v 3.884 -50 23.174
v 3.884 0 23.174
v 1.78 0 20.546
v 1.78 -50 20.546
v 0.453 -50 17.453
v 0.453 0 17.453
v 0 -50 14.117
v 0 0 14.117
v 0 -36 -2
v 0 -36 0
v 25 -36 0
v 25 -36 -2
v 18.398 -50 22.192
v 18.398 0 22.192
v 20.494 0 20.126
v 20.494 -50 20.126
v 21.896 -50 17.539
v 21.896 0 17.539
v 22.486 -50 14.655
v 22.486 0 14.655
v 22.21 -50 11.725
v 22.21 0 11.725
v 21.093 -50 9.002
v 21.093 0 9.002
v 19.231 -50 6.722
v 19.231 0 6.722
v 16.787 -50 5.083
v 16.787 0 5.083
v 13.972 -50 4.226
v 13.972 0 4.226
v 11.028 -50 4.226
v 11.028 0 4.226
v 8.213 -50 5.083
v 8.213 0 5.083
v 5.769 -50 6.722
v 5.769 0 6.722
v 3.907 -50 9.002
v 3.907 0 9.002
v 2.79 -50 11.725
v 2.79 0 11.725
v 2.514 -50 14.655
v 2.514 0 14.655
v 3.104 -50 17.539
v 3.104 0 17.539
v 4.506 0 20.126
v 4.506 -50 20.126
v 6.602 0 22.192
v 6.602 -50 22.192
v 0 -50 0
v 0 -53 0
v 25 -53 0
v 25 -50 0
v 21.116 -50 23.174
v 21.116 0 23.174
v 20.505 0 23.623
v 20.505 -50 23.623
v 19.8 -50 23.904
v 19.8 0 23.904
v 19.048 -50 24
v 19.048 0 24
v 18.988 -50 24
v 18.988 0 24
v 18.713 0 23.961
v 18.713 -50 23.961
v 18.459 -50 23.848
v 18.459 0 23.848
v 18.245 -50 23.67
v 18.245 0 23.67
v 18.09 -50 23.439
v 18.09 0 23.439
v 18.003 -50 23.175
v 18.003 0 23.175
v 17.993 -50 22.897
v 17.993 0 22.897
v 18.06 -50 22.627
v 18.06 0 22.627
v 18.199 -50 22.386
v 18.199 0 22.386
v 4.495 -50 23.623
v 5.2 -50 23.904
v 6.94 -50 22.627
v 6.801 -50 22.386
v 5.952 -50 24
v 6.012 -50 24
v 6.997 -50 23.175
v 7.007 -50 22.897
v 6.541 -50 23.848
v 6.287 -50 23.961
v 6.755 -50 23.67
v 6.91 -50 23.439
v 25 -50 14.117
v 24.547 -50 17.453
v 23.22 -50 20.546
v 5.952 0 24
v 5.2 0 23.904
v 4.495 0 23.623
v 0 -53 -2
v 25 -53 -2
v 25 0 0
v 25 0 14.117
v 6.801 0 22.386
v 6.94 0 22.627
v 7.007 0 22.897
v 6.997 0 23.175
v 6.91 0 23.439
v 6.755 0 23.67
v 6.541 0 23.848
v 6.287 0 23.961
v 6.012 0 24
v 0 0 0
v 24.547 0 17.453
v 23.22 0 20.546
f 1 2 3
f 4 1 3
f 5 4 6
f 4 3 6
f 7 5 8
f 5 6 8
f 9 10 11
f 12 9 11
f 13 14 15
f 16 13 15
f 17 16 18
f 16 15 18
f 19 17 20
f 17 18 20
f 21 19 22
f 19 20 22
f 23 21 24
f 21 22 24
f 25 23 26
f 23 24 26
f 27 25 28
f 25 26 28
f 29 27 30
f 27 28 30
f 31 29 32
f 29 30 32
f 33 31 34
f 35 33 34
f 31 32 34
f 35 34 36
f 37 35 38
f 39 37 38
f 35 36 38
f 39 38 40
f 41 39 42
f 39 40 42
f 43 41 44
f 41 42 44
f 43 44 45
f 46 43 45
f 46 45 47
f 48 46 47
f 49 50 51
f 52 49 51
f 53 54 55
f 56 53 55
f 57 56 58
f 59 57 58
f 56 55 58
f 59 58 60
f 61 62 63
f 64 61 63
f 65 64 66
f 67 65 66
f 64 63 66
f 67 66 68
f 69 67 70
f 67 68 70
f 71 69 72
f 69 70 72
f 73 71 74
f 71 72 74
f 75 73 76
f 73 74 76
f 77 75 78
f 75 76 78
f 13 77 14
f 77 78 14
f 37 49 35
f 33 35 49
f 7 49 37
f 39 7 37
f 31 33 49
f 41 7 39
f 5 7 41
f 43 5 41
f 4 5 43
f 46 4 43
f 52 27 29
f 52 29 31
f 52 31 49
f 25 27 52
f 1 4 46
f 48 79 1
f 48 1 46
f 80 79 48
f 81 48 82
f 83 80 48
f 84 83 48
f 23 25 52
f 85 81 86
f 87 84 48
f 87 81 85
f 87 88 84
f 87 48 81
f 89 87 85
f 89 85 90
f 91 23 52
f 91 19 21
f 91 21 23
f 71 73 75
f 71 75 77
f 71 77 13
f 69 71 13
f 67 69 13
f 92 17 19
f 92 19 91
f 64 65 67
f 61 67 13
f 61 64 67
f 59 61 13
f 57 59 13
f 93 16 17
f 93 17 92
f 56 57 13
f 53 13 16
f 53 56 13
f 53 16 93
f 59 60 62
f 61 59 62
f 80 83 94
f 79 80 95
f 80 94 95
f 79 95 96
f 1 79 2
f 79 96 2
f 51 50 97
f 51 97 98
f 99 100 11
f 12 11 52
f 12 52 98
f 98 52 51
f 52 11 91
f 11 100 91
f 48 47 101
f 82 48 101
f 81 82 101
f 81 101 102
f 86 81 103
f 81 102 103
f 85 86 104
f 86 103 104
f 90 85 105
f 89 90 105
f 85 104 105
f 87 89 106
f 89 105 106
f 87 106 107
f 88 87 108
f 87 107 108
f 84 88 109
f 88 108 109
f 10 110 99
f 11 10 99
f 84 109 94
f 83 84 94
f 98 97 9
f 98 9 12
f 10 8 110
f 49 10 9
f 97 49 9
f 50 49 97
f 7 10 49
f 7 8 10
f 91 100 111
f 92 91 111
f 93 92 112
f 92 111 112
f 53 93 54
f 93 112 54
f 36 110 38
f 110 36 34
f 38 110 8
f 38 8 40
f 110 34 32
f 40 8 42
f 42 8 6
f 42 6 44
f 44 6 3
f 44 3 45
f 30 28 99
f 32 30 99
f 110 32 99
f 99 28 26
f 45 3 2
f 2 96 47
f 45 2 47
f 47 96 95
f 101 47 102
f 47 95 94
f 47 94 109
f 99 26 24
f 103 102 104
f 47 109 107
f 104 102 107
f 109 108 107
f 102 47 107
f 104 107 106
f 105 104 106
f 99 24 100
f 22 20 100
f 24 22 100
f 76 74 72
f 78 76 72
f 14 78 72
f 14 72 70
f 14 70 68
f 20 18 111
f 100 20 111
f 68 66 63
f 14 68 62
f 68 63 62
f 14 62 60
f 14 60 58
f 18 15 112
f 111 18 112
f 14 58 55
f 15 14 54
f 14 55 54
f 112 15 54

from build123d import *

# Parameters (mm, degrees)
F1_DEPTH = 50
F2_W     = 25
F2_H     = 17
F3_DEPTH = 2


with BuildPart() as f1:
    # F0 (on Front) → F1 (new body)
    with BuildSketch(Plane.XZ):
        with BuildLine():
            Line((0, 14.117118), (0, 0))
            Line((0, 0), (25, 0))
            Line((25, 0), (25, 14.117118))
            ThreePointArc((25, 14.117118), (23.98797, 19.044242), (21.115752, 23.173542))
            ThreePointArc((21.115752, 23.173542), (20.161384, 23.785734), (19.047972, 24))
            Line((19.047972, 24), (18.98802, 24))
            ThreePointArc((18.98802, 24), (18.037353, 23.310214), (18.3982, 22.192465))
            ThreePointArc((18.3982, 22.192465), (12.5, 4.117118), (6.6018, 22.192465))
            ThreePointArc((6.6018, 22.192465), (6.962647, 23.310214), (6.01198, 24))
            Line((6.01198, 24), (5.952028, 24))
            ThreePointArc((5.952028, 24), (4.838616, 23.785734), (3.884248, 23.173542))
            ThreePointArc((3.884248, 23.173542), (1.01203, 19.044242), (0, 14.117118))
        make_face()
    extrude(amount=F1_DEPTH)

    # F2 (on face) → F3 (join)
    with BuildSketch(Plane(origin=(0, 0, 0), x_dir=(1, 0, 0), z_dir=(0, 0, -1))):
        with Locations((12.5, 44.5)):
            Rectangle(F2_W, F2_H)
    extrude(amount=F3_DEPTH)


solid = f1.part
